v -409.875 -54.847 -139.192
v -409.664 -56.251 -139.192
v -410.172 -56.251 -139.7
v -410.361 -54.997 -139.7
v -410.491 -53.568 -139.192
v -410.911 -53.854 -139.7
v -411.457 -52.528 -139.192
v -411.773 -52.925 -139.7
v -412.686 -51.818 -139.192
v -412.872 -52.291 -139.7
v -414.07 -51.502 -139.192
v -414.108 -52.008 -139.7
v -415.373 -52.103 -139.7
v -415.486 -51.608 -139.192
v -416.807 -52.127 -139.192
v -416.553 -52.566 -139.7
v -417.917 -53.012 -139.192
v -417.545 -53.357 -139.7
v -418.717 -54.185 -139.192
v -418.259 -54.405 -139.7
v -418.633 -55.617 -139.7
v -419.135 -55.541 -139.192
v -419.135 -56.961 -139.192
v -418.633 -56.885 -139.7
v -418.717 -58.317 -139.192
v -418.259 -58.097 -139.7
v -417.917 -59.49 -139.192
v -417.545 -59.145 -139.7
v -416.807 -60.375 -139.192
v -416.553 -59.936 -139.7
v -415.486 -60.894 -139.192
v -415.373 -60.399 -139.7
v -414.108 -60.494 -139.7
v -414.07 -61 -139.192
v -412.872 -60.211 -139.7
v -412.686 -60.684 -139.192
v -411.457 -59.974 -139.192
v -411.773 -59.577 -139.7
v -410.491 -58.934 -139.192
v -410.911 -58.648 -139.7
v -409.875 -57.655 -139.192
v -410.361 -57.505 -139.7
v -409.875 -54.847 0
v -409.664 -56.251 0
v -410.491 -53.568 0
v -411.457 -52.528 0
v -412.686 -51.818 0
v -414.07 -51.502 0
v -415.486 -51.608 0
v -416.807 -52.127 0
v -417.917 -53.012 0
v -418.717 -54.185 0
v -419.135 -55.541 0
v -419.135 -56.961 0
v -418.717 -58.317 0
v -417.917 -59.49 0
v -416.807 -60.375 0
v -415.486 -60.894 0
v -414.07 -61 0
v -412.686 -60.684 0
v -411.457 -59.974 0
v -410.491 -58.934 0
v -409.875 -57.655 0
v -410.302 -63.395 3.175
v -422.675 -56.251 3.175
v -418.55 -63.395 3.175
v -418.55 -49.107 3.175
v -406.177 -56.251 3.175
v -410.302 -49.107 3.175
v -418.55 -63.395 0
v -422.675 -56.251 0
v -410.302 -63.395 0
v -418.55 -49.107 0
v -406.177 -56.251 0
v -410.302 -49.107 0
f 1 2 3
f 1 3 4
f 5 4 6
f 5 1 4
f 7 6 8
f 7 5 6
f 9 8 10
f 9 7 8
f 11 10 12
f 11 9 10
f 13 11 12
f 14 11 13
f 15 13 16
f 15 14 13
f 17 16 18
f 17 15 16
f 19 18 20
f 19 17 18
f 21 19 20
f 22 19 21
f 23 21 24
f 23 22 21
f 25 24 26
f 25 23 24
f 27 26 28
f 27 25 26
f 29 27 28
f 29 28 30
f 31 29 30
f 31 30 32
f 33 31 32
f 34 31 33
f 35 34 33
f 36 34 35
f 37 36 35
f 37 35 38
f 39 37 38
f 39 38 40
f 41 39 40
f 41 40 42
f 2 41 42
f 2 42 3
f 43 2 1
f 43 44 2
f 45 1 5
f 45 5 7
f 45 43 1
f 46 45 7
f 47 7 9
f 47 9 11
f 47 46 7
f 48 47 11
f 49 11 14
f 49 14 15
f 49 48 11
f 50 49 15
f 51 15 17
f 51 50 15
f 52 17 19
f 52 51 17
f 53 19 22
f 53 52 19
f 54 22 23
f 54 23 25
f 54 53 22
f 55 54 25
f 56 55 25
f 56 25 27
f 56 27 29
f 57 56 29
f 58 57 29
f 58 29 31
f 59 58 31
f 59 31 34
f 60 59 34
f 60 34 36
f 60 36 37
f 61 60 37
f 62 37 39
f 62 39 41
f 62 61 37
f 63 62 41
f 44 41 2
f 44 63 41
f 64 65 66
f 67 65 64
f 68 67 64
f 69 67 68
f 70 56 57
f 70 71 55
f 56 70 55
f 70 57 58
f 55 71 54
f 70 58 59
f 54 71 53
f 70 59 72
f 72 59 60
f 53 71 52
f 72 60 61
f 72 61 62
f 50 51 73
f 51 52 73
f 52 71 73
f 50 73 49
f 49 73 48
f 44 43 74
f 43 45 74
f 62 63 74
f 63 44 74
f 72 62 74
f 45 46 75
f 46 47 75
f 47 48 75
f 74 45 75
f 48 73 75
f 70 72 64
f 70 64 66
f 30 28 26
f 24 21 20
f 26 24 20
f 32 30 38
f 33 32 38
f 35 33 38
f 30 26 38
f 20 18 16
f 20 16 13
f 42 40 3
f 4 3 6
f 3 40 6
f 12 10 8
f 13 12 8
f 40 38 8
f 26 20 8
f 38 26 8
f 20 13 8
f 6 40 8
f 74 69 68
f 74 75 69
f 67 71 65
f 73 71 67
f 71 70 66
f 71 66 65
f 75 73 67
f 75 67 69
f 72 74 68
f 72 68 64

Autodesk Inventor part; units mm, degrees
ref_plane "YZ Plane" through (0, 0, 0) normal (1, 0, 0) x (0, 1, 0)
ref_plane "XZ Plane" through (0, 0, 0) normal (0, 1, 0) x (-1, 0, 0)
ref_plane "XY Plane" through (0, 0, 0) normal (0, 0, 1) x (1, 0, 0)
sketch "Sketch1" plane through (0, 0, 0) normal (0, 0, 1) x (1, 0, 0)
  circle A0 centre (-414.4261, -56.251) radius 4.7625
  point P0 (0, 0)
  dimension "d0" = 9.525
extrude "Extrusion1" add sketch "Sketch1" against normal blind 139.7
sketch "Sketch2" plane through (-414.4261, -56.251, 0) normal (0, 0, 1) x (1, 0, 0)
  circle A0 centre (0, 0) radius 4.7625 projected
  line L0 (-8.2489, 0) -> (-4.1244, 7.1437)
  line L1 (-4.1244, 7.1437) -> (4.1244, 7.1438)
  line L2 (4.1244, 7.1438) -> (8.2489, 0)
  line L3 (8.2489, 0) -> (4.1244, -7.1437)
  line L4 (4.1244, -7.1437) -> (-4.1244, -7.1438)
  line L5 (-4.1244, -7.1438) -> (-8.2489, 0)
  point P0 (414.4261, 56.251)
  dimension "d3" = 14.2875
extrude "Extrusion2" add sketch "Sketch2" along normal blind 3.175 contours A0 | L0 L1 L2 L3 L4 L5
thread "Thread1" size "3/8-16 UNC" class "2A" standard "ANSI Unified Screw Threads" length 25.4
chamfer "Chamfer1" distance 0.508 angle 45 1 edges at (-419.1886, -56.251, -139.7)
properties part number "375 bolt x4" material "Steel"
